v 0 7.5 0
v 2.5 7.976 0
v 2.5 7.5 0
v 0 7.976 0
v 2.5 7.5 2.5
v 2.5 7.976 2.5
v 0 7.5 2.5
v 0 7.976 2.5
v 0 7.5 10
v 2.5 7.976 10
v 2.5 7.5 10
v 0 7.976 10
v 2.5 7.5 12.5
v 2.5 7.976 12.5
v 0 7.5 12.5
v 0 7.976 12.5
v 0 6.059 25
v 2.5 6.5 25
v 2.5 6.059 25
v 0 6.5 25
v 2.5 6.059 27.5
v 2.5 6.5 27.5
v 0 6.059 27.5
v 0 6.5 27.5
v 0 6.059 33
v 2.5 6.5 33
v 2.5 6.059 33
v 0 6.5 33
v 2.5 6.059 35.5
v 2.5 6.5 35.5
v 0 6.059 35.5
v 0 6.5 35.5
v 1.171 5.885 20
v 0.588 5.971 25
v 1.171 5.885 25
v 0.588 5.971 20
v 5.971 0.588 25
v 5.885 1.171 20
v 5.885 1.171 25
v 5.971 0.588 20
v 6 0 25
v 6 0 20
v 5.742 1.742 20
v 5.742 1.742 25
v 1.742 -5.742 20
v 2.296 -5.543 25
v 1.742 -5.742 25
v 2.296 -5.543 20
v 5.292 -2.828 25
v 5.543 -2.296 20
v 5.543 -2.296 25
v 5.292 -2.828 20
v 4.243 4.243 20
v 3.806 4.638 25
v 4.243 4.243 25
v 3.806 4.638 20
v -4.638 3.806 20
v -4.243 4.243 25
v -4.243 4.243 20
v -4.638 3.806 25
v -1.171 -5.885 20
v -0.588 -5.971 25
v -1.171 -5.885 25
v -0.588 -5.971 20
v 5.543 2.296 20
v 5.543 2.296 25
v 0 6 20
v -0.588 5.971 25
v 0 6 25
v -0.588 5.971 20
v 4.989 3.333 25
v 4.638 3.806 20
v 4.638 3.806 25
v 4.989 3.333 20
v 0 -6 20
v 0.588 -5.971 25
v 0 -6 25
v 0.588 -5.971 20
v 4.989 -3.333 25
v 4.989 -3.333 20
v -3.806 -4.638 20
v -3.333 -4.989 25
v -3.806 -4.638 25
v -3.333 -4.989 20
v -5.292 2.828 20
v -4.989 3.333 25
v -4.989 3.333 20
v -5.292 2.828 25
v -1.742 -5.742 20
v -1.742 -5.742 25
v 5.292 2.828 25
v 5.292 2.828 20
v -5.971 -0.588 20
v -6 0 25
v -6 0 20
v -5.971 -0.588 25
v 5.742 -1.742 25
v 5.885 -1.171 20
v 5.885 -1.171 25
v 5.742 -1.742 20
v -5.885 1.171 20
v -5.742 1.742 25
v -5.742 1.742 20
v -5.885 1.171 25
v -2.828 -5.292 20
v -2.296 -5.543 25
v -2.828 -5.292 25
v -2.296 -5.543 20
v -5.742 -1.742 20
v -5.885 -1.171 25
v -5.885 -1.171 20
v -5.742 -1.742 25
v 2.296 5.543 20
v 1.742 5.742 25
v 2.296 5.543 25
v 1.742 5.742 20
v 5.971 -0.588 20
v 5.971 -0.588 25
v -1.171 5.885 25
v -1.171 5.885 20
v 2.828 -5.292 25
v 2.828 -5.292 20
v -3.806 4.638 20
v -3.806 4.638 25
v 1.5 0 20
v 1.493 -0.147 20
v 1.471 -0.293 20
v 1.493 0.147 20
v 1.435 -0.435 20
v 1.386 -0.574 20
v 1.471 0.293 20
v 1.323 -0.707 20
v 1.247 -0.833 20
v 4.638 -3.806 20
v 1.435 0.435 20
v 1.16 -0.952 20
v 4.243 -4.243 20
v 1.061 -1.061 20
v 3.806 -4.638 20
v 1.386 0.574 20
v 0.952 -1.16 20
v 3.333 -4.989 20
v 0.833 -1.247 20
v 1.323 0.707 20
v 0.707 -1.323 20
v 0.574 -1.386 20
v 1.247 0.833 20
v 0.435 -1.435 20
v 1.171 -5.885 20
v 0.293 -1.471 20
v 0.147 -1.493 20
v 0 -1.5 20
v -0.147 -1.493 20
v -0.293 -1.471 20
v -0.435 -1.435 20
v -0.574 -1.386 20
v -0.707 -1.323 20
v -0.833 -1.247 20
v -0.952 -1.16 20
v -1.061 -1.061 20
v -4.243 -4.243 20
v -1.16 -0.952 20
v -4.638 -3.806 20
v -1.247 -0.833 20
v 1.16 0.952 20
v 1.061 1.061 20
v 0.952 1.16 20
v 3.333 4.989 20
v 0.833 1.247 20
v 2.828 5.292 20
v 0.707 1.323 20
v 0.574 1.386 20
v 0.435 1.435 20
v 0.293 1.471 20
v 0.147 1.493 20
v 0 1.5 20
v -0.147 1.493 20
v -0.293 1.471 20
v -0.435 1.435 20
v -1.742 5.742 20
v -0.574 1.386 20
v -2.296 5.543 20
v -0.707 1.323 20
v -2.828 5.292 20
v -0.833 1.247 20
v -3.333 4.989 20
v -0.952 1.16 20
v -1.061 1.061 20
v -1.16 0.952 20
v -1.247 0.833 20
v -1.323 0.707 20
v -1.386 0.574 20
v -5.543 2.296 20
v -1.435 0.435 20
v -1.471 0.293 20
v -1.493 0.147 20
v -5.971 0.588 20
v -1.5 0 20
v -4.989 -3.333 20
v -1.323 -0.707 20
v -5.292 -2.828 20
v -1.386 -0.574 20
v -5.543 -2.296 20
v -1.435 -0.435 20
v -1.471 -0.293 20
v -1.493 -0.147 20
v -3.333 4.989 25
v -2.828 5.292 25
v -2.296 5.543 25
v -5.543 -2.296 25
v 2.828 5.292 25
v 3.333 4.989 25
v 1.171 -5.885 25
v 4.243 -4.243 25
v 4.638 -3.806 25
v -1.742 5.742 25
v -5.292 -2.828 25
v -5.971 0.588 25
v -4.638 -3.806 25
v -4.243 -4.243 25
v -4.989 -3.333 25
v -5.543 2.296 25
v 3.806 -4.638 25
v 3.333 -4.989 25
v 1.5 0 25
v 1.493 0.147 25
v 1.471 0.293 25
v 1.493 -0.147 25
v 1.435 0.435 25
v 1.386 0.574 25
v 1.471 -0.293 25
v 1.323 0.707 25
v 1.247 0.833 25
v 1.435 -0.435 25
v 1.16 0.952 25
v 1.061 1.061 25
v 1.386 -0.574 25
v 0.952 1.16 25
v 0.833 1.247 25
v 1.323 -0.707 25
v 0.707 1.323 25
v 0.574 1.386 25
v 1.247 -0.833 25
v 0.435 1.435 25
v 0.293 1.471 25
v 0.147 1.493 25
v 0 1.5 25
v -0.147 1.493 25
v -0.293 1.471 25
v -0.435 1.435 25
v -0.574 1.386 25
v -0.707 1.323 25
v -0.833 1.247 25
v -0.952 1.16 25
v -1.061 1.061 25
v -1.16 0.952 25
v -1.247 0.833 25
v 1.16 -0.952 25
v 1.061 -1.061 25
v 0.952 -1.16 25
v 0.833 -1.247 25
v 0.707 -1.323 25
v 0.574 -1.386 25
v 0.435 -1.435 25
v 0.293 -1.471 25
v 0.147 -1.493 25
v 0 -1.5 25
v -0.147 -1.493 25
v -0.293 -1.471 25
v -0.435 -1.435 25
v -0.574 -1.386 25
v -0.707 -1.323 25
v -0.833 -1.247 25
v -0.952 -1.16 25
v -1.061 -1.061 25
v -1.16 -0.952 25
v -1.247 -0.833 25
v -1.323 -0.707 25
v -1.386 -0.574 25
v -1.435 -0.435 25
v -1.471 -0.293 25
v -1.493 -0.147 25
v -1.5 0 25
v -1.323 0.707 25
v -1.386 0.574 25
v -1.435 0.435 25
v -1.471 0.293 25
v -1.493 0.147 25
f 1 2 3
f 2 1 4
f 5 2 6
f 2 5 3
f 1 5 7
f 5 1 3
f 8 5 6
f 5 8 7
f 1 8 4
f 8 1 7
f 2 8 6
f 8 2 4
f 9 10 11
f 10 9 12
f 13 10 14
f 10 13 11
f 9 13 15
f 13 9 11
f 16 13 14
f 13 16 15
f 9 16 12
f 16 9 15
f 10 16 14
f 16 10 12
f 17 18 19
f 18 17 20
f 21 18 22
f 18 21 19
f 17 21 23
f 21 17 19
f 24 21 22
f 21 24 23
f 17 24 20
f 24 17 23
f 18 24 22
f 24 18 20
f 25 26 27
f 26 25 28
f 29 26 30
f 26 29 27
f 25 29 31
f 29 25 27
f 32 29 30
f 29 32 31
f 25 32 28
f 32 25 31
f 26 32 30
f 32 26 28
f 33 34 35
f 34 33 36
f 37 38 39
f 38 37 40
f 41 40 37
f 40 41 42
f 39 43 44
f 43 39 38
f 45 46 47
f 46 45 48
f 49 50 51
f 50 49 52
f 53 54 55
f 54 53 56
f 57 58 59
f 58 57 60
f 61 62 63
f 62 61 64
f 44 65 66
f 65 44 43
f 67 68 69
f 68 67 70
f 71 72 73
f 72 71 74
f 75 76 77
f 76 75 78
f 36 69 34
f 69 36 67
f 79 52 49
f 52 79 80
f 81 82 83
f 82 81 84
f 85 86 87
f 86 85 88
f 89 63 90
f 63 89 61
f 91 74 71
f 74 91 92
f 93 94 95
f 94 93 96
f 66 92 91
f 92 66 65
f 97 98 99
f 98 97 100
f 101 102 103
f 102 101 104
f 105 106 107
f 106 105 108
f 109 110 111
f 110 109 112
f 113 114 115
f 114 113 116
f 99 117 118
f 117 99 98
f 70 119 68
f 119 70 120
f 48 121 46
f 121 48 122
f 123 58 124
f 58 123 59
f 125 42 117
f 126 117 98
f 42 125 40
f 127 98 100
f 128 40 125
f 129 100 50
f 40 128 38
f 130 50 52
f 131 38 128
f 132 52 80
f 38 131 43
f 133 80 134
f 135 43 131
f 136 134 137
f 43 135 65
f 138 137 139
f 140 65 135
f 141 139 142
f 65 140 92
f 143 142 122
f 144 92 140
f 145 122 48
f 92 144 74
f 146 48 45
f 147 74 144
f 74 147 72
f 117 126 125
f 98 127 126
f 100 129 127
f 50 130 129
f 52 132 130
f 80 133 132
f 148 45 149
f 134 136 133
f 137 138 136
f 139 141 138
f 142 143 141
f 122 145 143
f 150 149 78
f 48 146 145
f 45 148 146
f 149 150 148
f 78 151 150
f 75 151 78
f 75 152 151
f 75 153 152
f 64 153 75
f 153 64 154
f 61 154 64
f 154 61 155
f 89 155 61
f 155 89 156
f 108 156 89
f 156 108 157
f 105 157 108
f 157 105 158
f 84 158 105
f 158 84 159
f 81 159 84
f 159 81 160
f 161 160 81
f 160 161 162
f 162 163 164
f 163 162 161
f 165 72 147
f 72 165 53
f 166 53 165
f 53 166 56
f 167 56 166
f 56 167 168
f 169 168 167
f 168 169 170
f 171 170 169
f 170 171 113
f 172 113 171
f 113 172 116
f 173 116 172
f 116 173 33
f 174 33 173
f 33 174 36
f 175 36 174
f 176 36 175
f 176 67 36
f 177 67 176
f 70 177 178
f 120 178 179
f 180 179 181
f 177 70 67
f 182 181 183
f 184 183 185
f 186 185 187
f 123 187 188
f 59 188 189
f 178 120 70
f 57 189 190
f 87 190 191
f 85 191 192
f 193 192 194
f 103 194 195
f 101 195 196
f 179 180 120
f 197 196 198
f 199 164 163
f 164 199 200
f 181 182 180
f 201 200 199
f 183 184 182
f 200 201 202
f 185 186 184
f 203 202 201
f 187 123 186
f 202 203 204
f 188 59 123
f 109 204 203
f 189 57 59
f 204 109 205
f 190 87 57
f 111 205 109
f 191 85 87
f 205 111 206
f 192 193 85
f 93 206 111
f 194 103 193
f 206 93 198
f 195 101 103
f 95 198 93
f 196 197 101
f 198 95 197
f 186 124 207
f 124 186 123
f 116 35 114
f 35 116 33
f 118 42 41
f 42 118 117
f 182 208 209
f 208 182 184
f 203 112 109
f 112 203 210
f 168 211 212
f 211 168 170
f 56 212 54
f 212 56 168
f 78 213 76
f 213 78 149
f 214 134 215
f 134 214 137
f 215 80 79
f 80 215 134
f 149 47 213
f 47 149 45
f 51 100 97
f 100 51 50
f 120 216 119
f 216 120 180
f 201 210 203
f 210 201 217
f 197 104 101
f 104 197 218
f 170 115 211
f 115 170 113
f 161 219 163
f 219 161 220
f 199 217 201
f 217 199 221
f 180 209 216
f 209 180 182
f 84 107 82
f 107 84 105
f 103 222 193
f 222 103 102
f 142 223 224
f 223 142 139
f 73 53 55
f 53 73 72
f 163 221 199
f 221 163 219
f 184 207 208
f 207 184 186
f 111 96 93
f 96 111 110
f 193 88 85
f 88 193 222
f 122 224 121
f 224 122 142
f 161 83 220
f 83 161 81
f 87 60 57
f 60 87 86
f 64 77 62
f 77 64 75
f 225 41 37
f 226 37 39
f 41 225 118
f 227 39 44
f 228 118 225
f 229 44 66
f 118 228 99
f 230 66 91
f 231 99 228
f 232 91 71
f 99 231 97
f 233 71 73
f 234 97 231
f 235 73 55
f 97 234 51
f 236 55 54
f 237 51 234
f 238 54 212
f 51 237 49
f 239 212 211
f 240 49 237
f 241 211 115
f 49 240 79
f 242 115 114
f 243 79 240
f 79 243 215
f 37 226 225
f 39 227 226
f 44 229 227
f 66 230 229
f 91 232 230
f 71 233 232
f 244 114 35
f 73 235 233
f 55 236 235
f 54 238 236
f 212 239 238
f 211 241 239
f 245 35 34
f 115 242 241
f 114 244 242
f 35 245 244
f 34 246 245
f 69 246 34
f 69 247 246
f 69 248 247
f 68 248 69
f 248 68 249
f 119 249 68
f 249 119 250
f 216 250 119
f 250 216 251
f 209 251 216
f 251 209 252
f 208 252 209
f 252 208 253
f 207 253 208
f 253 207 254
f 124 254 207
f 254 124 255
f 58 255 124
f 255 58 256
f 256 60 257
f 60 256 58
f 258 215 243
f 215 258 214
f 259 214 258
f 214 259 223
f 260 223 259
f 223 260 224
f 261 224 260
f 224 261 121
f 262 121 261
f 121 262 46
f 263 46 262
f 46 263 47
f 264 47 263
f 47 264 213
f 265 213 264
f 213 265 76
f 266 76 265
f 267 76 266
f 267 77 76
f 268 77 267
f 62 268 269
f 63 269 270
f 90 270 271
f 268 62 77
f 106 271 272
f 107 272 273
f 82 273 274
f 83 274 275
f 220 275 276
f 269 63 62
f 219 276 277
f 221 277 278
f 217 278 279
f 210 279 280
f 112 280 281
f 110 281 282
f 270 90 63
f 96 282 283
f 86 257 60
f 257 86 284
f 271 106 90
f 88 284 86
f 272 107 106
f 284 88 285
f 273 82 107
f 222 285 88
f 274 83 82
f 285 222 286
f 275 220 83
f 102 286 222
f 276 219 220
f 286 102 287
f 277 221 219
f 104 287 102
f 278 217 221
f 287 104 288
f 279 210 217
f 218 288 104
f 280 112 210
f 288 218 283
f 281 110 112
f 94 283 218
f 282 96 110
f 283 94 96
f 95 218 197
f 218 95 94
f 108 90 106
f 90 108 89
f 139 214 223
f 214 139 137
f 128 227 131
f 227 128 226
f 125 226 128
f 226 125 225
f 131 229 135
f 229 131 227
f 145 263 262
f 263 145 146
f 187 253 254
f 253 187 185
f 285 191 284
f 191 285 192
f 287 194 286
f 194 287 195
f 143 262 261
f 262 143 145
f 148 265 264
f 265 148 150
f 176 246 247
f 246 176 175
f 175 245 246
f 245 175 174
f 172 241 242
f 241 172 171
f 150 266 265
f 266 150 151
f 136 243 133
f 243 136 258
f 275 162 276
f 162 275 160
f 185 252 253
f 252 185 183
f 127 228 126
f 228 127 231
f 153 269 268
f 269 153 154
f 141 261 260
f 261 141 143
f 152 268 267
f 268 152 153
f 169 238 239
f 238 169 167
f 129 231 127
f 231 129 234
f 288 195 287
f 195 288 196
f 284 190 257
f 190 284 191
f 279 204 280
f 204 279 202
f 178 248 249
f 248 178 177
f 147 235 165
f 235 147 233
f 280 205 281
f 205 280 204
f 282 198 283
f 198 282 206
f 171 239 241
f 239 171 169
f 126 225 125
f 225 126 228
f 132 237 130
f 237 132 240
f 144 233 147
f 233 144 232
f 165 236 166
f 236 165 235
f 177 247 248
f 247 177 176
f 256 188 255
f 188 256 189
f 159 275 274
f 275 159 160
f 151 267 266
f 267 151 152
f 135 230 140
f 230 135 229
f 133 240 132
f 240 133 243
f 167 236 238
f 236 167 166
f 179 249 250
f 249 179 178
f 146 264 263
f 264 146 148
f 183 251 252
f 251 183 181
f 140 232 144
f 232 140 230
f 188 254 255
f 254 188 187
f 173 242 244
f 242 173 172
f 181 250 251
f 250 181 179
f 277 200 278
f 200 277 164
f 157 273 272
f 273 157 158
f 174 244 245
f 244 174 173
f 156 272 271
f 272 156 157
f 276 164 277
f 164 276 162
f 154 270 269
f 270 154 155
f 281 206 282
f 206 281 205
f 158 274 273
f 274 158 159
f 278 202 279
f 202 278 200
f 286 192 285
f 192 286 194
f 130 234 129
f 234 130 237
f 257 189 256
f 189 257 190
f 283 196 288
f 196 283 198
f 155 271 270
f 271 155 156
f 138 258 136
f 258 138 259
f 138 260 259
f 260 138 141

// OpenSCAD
// Straight hose-barb reducer: 8 mm tubing -> 5 mm tubing
// Print orientation: standing upright along +Z, centred on origin in X/Y

$fn = 64;

// ---- Dimensions (mm) ----
reducer_length   = 41;   // total length of the part
bore_d           = 3;    // through-bore diameter
wall_d           = 2;    // wall thickness of the bore (1.5 mm each side)

barb_8_count     = 2;    // number of 8 mm barbs, stacked
barb_8_height    = 10;   // height of each 8 mm barb
barb_8_bottom_d  = 7.5;  // outer diameter of 8 mm barb at its bottom
barb_8_top_d     = 9.5;  // outer diameter of 8 mm barb at its top

barb_5_count     = 2;    // number of 5 mm barbs, stacked
barb_5_height    = 8;    // height of each 5 mm barb
barb_5_bottom_d  = 6.5;  // outer diameter of 5 mm barb at its bottom
barb_5_top_d     = 5.0;  // outer diameter of 5 mm barb at its top

collar_d         = 12;   // outer diameter of the collar
collar_start_z   = 20;   // z where the collar begins
collar_end_z     = 25;   // z where the collar ends

eps              = 0.5;  // overshoot for clean boolean cuts

// ---- Derived ----
barb_8_z0 = 0;
barb_8_z1 = barb_8_height;
barb_5_z0 = collar_end_z;
barb_5_z1 = barb_5_height + collar_end_z;

// ---- Model ----
difference() {
    union() {
        // 8 mm barbs
        for (i = [0 : barb_8_count - 1]) {
            translate([0, 0, barb_8_z0 + i * barb_8_height])
                linear_extrude(height = wall_d + eps)
                    polygon([
                        [0, barb_8_bottom_d],
                        [wall_d + eps, barb_8_bottom_d],
                        [wall_d + eps,
                         min(barb_8_top_d,
                              barb_8_bottom_d + (barb_8_top_d - barb_8_bottom_d) *
                                              (eps + wall_d) / (barb_8_height + eps))],
                        [0,
                         min(barb_8_top_d,
                              barb_8_bottom_d + (barb_8_top_d - barb_8_bottom_d) *
                                              (eps + wall_d) / (barb_8_height + eps))]
                    ]);
        }

        // collar
        translate([0, 0, collar_start_z])
            cylinder(d = collar_d, h = collar_end_z - collar_start_z);

        // 5 mm barbs
        for (i = [0 : barb_5_count - 1]) {
            translate([0, 0, barb_5_z0 + i * barb_5_height])
                linear_extrude(height = wall_d + eps)
                    polygon([
                        [0, barb_5_bottom_d],
                        [wall_d + eps, barb_5_bottom_d],
                        [wall_d + eps,
                         max(barb_5_top_d,
                              barb_5_bottom_d - (barb_5_bottom_d - barb_5_top_d) *
                                              (eps + wall_d) / (barb_5_height + eps))],
                        [0,
                         max(barb_5_top_d,
                              barb_5_bottom_d - (barb_5_bottom_d - barb_5_top_d) *
                                              (eps + wall_d) / (barb_5_height + eps))]
                    ]);
        }
    }

    // through-bore
    translate([0, 0, -eps])
        cylinder(d = bore_d, h = reducer_length + 2 * eps);
}
